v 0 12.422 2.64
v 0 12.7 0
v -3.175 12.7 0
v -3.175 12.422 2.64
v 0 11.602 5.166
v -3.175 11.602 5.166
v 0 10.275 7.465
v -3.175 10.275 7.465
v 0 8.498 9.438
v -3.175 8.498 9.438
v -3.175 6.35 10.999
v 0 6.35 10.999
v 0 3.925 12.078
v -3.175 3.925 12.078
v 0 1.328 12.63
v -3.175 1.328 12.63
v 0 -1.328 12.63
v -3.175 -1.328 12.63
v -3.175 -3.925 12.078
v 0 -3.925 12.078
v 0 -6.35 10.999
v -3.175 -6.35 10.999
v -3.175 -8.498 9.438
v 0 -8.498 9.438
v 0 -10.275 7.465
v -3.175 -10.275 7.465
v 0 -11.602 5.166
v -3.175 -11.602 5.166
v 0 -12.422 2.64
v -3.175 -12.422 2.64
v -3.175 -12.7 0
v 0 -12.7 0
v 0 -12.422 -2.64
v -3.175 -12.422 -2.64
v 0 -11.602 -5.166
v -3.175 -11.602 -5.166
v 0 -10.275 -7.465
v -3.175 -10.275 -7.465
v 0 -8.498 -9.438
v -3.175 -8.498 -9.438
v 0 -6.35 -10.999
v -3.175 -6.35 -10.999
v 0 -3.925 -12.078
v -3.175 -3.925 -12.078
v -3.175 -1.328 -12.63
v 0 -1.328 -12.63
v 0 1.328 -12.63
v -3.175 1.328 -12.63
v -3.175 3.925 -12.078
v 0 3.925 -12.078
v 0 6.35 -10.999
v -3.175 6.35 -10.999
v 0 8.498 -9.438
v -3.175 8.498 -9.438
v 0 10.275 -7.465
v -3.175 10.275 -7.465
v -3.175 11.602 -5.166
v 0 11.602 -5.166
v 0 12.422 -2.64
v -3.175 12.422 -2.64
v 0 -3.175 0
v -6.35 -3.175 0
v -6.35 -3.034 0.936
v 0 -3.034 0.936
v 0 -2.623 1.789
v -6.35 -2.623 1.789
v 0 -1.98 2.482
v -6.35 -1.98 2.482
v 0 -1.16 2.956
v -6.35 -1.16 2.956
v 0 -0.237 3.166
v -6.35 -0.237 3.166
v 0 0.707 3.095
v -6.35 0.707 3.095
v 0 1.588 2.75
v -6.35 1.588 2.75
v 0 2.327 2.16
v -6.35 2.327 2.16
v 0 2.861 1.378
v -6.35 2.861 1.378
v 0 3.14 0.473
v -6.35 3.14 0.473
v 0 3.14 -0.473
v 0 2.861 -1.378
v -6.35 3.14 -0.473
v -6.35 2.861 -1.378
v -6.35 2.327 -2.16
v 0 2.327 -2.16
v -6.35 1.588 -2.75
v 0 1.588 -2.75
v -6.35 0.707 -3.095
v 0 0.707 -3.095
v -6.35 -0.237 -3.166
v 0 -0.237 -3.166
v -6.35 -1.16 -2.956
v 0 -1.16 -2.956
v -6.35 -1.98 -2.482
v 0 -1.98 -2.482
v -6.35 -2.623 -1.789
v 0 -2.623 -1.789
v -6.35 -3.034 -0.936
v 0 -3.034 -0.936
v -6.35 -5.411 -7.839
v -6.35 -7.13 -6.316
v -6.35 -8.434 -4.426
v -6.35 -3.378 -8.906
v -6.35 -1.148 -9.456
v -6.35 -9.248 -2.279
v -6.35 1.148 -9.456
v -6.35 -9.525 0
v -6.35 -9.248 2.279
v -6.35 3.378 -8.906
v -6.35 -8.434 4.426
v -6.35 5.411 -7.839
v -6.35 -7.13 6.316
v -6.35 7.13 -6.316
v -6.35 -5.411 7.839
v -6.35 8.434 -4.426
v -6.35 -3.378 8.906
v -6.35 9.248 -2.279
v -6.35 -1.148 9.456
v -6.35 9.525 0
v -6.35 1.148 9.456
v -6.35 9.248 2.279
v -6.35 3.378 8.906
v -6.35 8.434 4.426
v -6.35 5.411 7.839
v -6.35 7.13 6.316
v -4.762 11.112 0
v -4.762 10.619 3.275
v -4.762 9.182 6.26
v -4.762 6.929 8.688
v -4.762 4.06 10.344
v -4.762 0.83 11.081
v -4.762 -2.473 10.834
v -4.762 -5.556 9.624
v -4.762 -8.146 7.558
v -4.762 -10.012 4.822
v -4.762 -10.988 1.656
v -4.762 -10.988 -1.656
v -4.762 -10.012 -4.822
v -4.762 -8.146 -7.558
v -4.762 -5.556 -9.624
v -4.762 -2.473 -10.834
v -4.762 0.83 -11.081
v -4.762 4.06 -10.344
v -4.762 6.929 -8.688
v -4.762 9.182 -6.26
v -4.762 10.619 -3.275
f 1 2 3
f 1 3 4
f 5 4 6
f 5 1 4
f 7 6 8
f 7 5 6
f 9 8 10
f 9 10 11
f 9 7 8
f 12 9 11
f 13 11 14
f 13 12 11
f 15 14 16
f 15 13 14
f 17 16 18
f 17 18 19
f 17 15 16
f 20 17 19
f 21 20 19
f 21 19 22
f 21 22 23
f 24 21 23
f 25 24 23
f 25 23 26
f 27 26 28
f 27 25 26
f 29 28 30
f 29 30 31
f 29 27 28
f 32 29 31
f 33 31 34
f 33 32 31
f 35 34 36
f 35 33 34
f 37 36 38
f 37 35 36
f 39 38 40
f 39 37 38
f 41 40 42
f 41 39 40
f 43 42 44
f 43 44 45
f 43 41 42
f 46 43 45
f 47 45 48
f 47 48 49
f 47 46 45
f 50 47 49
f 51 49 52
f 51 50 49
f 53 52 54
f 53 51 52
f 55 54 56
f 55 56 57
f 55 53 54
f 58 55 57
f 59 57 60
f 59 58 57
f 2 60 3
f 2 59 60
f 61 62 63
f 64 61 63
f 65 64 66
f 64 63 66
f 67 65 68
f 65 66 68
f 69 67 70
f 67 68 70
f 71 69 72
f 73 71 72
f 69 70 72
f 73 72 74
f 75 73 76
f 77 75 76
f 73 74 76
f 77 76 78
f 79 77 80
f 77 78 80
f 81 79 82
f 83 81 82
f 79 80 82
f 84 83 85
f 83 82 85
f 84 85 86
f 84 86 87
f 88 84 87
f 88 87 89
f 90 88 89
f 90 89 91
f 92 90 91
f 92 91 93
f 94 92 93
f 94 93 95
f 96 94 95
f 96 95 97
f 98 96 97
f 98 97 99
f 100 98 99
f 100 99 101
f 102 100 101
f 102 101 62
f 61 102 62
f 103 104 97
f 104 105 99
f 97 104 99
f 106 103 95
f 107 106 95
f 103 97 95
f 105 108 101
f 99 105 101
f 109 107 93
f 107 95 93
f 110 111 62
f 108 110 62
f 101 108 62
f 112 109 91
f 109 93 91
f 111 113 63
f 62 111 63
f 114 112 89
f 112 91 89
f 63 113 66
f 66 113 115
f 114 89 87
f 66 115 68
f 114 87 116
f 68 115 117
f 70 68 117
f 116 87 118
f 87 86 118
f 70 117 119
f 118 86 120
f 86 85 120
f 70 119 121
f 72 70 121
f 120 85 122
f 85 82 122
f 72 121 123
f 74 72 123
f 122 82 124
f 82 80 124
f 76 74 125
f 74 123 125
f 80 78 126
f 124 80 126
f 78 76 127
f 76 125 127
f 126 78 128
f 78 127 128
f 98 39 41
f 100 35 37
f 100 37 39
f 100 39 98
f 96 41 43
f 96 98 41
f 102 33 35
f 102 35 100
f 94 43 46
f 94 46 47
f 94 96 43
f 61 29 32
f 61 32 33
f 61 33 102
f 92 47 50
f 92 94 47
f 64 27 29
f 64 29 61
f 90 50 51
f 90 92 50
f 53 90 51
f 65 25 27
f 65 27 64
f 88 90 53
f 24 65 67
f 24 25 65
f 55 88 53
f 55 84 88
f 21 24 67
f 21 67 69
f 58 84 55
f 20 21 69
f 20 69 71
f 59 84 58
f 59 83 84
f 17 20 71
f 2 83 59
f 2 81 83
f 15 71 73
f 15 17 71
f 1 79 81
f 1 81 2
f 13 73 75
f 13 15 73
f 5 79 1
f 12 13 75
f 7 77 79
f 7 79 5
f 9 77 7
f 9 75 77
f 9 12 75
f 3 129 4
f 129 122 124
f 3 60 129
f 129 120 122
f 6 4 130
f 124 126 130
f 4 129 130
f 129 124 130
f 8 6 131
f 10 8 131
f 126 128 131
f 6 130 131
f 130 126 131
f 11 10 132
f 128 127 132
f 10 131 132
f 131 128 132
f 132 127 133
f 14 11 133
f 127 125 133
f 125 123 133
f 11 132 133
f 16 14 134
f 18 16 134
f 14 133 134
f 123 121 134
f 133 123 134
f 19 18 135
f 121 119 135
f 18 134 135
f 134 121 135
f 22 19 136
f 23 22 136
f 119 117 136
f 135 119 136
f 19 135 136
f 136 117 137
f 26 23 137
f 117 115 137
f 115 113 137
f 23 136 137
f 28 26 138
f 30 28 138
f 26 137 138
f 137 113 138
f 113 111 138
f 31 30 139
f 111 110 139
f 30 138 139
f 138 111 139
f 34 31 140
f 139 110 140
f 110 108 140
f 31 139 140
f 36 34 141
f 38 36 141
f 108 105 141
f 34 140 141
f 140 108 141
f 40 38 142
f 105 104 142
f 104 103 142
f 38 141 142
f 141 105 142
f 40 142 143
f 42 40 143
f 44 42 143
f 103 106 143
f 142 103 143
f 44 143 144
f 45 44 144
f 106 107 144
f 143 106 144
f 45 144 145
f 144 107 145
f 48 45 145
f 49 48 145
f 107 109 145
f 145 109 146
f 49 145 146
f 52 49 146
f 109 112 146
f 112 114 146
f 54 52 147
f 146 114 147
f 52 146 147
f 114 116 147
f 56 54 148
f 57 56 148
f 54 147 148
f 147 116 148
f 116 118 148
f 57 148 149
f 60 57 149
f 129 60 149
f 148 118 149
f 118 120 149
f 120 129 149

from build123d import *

# Parameters (mm, degrees)
F0_R     = 12.7
F1_DEPTH = 6.35
F3_D     = 6.35
F4_SIZE  = 3.175


with BuildPart() as f1:
    # F0 (on Right) → F1 (new body)
    with BuildSketch(Plane.YZ):
        Circle(F0_R)
    extrude(amount=-F1_DEPTH)

    # F3 (through all)
    with Locations(Plane.YZ):
        with Locations((0, 0)):
            Hole(F3_D / 2)

    # F4
    f4_edges = [f1.edges().sort_by_distance(p)[0] for p in [
        (-6.35, -12.7, 0),
    ]]
    chamfer(f4_edges, length=F4_SIZE)


solid = f1.part
